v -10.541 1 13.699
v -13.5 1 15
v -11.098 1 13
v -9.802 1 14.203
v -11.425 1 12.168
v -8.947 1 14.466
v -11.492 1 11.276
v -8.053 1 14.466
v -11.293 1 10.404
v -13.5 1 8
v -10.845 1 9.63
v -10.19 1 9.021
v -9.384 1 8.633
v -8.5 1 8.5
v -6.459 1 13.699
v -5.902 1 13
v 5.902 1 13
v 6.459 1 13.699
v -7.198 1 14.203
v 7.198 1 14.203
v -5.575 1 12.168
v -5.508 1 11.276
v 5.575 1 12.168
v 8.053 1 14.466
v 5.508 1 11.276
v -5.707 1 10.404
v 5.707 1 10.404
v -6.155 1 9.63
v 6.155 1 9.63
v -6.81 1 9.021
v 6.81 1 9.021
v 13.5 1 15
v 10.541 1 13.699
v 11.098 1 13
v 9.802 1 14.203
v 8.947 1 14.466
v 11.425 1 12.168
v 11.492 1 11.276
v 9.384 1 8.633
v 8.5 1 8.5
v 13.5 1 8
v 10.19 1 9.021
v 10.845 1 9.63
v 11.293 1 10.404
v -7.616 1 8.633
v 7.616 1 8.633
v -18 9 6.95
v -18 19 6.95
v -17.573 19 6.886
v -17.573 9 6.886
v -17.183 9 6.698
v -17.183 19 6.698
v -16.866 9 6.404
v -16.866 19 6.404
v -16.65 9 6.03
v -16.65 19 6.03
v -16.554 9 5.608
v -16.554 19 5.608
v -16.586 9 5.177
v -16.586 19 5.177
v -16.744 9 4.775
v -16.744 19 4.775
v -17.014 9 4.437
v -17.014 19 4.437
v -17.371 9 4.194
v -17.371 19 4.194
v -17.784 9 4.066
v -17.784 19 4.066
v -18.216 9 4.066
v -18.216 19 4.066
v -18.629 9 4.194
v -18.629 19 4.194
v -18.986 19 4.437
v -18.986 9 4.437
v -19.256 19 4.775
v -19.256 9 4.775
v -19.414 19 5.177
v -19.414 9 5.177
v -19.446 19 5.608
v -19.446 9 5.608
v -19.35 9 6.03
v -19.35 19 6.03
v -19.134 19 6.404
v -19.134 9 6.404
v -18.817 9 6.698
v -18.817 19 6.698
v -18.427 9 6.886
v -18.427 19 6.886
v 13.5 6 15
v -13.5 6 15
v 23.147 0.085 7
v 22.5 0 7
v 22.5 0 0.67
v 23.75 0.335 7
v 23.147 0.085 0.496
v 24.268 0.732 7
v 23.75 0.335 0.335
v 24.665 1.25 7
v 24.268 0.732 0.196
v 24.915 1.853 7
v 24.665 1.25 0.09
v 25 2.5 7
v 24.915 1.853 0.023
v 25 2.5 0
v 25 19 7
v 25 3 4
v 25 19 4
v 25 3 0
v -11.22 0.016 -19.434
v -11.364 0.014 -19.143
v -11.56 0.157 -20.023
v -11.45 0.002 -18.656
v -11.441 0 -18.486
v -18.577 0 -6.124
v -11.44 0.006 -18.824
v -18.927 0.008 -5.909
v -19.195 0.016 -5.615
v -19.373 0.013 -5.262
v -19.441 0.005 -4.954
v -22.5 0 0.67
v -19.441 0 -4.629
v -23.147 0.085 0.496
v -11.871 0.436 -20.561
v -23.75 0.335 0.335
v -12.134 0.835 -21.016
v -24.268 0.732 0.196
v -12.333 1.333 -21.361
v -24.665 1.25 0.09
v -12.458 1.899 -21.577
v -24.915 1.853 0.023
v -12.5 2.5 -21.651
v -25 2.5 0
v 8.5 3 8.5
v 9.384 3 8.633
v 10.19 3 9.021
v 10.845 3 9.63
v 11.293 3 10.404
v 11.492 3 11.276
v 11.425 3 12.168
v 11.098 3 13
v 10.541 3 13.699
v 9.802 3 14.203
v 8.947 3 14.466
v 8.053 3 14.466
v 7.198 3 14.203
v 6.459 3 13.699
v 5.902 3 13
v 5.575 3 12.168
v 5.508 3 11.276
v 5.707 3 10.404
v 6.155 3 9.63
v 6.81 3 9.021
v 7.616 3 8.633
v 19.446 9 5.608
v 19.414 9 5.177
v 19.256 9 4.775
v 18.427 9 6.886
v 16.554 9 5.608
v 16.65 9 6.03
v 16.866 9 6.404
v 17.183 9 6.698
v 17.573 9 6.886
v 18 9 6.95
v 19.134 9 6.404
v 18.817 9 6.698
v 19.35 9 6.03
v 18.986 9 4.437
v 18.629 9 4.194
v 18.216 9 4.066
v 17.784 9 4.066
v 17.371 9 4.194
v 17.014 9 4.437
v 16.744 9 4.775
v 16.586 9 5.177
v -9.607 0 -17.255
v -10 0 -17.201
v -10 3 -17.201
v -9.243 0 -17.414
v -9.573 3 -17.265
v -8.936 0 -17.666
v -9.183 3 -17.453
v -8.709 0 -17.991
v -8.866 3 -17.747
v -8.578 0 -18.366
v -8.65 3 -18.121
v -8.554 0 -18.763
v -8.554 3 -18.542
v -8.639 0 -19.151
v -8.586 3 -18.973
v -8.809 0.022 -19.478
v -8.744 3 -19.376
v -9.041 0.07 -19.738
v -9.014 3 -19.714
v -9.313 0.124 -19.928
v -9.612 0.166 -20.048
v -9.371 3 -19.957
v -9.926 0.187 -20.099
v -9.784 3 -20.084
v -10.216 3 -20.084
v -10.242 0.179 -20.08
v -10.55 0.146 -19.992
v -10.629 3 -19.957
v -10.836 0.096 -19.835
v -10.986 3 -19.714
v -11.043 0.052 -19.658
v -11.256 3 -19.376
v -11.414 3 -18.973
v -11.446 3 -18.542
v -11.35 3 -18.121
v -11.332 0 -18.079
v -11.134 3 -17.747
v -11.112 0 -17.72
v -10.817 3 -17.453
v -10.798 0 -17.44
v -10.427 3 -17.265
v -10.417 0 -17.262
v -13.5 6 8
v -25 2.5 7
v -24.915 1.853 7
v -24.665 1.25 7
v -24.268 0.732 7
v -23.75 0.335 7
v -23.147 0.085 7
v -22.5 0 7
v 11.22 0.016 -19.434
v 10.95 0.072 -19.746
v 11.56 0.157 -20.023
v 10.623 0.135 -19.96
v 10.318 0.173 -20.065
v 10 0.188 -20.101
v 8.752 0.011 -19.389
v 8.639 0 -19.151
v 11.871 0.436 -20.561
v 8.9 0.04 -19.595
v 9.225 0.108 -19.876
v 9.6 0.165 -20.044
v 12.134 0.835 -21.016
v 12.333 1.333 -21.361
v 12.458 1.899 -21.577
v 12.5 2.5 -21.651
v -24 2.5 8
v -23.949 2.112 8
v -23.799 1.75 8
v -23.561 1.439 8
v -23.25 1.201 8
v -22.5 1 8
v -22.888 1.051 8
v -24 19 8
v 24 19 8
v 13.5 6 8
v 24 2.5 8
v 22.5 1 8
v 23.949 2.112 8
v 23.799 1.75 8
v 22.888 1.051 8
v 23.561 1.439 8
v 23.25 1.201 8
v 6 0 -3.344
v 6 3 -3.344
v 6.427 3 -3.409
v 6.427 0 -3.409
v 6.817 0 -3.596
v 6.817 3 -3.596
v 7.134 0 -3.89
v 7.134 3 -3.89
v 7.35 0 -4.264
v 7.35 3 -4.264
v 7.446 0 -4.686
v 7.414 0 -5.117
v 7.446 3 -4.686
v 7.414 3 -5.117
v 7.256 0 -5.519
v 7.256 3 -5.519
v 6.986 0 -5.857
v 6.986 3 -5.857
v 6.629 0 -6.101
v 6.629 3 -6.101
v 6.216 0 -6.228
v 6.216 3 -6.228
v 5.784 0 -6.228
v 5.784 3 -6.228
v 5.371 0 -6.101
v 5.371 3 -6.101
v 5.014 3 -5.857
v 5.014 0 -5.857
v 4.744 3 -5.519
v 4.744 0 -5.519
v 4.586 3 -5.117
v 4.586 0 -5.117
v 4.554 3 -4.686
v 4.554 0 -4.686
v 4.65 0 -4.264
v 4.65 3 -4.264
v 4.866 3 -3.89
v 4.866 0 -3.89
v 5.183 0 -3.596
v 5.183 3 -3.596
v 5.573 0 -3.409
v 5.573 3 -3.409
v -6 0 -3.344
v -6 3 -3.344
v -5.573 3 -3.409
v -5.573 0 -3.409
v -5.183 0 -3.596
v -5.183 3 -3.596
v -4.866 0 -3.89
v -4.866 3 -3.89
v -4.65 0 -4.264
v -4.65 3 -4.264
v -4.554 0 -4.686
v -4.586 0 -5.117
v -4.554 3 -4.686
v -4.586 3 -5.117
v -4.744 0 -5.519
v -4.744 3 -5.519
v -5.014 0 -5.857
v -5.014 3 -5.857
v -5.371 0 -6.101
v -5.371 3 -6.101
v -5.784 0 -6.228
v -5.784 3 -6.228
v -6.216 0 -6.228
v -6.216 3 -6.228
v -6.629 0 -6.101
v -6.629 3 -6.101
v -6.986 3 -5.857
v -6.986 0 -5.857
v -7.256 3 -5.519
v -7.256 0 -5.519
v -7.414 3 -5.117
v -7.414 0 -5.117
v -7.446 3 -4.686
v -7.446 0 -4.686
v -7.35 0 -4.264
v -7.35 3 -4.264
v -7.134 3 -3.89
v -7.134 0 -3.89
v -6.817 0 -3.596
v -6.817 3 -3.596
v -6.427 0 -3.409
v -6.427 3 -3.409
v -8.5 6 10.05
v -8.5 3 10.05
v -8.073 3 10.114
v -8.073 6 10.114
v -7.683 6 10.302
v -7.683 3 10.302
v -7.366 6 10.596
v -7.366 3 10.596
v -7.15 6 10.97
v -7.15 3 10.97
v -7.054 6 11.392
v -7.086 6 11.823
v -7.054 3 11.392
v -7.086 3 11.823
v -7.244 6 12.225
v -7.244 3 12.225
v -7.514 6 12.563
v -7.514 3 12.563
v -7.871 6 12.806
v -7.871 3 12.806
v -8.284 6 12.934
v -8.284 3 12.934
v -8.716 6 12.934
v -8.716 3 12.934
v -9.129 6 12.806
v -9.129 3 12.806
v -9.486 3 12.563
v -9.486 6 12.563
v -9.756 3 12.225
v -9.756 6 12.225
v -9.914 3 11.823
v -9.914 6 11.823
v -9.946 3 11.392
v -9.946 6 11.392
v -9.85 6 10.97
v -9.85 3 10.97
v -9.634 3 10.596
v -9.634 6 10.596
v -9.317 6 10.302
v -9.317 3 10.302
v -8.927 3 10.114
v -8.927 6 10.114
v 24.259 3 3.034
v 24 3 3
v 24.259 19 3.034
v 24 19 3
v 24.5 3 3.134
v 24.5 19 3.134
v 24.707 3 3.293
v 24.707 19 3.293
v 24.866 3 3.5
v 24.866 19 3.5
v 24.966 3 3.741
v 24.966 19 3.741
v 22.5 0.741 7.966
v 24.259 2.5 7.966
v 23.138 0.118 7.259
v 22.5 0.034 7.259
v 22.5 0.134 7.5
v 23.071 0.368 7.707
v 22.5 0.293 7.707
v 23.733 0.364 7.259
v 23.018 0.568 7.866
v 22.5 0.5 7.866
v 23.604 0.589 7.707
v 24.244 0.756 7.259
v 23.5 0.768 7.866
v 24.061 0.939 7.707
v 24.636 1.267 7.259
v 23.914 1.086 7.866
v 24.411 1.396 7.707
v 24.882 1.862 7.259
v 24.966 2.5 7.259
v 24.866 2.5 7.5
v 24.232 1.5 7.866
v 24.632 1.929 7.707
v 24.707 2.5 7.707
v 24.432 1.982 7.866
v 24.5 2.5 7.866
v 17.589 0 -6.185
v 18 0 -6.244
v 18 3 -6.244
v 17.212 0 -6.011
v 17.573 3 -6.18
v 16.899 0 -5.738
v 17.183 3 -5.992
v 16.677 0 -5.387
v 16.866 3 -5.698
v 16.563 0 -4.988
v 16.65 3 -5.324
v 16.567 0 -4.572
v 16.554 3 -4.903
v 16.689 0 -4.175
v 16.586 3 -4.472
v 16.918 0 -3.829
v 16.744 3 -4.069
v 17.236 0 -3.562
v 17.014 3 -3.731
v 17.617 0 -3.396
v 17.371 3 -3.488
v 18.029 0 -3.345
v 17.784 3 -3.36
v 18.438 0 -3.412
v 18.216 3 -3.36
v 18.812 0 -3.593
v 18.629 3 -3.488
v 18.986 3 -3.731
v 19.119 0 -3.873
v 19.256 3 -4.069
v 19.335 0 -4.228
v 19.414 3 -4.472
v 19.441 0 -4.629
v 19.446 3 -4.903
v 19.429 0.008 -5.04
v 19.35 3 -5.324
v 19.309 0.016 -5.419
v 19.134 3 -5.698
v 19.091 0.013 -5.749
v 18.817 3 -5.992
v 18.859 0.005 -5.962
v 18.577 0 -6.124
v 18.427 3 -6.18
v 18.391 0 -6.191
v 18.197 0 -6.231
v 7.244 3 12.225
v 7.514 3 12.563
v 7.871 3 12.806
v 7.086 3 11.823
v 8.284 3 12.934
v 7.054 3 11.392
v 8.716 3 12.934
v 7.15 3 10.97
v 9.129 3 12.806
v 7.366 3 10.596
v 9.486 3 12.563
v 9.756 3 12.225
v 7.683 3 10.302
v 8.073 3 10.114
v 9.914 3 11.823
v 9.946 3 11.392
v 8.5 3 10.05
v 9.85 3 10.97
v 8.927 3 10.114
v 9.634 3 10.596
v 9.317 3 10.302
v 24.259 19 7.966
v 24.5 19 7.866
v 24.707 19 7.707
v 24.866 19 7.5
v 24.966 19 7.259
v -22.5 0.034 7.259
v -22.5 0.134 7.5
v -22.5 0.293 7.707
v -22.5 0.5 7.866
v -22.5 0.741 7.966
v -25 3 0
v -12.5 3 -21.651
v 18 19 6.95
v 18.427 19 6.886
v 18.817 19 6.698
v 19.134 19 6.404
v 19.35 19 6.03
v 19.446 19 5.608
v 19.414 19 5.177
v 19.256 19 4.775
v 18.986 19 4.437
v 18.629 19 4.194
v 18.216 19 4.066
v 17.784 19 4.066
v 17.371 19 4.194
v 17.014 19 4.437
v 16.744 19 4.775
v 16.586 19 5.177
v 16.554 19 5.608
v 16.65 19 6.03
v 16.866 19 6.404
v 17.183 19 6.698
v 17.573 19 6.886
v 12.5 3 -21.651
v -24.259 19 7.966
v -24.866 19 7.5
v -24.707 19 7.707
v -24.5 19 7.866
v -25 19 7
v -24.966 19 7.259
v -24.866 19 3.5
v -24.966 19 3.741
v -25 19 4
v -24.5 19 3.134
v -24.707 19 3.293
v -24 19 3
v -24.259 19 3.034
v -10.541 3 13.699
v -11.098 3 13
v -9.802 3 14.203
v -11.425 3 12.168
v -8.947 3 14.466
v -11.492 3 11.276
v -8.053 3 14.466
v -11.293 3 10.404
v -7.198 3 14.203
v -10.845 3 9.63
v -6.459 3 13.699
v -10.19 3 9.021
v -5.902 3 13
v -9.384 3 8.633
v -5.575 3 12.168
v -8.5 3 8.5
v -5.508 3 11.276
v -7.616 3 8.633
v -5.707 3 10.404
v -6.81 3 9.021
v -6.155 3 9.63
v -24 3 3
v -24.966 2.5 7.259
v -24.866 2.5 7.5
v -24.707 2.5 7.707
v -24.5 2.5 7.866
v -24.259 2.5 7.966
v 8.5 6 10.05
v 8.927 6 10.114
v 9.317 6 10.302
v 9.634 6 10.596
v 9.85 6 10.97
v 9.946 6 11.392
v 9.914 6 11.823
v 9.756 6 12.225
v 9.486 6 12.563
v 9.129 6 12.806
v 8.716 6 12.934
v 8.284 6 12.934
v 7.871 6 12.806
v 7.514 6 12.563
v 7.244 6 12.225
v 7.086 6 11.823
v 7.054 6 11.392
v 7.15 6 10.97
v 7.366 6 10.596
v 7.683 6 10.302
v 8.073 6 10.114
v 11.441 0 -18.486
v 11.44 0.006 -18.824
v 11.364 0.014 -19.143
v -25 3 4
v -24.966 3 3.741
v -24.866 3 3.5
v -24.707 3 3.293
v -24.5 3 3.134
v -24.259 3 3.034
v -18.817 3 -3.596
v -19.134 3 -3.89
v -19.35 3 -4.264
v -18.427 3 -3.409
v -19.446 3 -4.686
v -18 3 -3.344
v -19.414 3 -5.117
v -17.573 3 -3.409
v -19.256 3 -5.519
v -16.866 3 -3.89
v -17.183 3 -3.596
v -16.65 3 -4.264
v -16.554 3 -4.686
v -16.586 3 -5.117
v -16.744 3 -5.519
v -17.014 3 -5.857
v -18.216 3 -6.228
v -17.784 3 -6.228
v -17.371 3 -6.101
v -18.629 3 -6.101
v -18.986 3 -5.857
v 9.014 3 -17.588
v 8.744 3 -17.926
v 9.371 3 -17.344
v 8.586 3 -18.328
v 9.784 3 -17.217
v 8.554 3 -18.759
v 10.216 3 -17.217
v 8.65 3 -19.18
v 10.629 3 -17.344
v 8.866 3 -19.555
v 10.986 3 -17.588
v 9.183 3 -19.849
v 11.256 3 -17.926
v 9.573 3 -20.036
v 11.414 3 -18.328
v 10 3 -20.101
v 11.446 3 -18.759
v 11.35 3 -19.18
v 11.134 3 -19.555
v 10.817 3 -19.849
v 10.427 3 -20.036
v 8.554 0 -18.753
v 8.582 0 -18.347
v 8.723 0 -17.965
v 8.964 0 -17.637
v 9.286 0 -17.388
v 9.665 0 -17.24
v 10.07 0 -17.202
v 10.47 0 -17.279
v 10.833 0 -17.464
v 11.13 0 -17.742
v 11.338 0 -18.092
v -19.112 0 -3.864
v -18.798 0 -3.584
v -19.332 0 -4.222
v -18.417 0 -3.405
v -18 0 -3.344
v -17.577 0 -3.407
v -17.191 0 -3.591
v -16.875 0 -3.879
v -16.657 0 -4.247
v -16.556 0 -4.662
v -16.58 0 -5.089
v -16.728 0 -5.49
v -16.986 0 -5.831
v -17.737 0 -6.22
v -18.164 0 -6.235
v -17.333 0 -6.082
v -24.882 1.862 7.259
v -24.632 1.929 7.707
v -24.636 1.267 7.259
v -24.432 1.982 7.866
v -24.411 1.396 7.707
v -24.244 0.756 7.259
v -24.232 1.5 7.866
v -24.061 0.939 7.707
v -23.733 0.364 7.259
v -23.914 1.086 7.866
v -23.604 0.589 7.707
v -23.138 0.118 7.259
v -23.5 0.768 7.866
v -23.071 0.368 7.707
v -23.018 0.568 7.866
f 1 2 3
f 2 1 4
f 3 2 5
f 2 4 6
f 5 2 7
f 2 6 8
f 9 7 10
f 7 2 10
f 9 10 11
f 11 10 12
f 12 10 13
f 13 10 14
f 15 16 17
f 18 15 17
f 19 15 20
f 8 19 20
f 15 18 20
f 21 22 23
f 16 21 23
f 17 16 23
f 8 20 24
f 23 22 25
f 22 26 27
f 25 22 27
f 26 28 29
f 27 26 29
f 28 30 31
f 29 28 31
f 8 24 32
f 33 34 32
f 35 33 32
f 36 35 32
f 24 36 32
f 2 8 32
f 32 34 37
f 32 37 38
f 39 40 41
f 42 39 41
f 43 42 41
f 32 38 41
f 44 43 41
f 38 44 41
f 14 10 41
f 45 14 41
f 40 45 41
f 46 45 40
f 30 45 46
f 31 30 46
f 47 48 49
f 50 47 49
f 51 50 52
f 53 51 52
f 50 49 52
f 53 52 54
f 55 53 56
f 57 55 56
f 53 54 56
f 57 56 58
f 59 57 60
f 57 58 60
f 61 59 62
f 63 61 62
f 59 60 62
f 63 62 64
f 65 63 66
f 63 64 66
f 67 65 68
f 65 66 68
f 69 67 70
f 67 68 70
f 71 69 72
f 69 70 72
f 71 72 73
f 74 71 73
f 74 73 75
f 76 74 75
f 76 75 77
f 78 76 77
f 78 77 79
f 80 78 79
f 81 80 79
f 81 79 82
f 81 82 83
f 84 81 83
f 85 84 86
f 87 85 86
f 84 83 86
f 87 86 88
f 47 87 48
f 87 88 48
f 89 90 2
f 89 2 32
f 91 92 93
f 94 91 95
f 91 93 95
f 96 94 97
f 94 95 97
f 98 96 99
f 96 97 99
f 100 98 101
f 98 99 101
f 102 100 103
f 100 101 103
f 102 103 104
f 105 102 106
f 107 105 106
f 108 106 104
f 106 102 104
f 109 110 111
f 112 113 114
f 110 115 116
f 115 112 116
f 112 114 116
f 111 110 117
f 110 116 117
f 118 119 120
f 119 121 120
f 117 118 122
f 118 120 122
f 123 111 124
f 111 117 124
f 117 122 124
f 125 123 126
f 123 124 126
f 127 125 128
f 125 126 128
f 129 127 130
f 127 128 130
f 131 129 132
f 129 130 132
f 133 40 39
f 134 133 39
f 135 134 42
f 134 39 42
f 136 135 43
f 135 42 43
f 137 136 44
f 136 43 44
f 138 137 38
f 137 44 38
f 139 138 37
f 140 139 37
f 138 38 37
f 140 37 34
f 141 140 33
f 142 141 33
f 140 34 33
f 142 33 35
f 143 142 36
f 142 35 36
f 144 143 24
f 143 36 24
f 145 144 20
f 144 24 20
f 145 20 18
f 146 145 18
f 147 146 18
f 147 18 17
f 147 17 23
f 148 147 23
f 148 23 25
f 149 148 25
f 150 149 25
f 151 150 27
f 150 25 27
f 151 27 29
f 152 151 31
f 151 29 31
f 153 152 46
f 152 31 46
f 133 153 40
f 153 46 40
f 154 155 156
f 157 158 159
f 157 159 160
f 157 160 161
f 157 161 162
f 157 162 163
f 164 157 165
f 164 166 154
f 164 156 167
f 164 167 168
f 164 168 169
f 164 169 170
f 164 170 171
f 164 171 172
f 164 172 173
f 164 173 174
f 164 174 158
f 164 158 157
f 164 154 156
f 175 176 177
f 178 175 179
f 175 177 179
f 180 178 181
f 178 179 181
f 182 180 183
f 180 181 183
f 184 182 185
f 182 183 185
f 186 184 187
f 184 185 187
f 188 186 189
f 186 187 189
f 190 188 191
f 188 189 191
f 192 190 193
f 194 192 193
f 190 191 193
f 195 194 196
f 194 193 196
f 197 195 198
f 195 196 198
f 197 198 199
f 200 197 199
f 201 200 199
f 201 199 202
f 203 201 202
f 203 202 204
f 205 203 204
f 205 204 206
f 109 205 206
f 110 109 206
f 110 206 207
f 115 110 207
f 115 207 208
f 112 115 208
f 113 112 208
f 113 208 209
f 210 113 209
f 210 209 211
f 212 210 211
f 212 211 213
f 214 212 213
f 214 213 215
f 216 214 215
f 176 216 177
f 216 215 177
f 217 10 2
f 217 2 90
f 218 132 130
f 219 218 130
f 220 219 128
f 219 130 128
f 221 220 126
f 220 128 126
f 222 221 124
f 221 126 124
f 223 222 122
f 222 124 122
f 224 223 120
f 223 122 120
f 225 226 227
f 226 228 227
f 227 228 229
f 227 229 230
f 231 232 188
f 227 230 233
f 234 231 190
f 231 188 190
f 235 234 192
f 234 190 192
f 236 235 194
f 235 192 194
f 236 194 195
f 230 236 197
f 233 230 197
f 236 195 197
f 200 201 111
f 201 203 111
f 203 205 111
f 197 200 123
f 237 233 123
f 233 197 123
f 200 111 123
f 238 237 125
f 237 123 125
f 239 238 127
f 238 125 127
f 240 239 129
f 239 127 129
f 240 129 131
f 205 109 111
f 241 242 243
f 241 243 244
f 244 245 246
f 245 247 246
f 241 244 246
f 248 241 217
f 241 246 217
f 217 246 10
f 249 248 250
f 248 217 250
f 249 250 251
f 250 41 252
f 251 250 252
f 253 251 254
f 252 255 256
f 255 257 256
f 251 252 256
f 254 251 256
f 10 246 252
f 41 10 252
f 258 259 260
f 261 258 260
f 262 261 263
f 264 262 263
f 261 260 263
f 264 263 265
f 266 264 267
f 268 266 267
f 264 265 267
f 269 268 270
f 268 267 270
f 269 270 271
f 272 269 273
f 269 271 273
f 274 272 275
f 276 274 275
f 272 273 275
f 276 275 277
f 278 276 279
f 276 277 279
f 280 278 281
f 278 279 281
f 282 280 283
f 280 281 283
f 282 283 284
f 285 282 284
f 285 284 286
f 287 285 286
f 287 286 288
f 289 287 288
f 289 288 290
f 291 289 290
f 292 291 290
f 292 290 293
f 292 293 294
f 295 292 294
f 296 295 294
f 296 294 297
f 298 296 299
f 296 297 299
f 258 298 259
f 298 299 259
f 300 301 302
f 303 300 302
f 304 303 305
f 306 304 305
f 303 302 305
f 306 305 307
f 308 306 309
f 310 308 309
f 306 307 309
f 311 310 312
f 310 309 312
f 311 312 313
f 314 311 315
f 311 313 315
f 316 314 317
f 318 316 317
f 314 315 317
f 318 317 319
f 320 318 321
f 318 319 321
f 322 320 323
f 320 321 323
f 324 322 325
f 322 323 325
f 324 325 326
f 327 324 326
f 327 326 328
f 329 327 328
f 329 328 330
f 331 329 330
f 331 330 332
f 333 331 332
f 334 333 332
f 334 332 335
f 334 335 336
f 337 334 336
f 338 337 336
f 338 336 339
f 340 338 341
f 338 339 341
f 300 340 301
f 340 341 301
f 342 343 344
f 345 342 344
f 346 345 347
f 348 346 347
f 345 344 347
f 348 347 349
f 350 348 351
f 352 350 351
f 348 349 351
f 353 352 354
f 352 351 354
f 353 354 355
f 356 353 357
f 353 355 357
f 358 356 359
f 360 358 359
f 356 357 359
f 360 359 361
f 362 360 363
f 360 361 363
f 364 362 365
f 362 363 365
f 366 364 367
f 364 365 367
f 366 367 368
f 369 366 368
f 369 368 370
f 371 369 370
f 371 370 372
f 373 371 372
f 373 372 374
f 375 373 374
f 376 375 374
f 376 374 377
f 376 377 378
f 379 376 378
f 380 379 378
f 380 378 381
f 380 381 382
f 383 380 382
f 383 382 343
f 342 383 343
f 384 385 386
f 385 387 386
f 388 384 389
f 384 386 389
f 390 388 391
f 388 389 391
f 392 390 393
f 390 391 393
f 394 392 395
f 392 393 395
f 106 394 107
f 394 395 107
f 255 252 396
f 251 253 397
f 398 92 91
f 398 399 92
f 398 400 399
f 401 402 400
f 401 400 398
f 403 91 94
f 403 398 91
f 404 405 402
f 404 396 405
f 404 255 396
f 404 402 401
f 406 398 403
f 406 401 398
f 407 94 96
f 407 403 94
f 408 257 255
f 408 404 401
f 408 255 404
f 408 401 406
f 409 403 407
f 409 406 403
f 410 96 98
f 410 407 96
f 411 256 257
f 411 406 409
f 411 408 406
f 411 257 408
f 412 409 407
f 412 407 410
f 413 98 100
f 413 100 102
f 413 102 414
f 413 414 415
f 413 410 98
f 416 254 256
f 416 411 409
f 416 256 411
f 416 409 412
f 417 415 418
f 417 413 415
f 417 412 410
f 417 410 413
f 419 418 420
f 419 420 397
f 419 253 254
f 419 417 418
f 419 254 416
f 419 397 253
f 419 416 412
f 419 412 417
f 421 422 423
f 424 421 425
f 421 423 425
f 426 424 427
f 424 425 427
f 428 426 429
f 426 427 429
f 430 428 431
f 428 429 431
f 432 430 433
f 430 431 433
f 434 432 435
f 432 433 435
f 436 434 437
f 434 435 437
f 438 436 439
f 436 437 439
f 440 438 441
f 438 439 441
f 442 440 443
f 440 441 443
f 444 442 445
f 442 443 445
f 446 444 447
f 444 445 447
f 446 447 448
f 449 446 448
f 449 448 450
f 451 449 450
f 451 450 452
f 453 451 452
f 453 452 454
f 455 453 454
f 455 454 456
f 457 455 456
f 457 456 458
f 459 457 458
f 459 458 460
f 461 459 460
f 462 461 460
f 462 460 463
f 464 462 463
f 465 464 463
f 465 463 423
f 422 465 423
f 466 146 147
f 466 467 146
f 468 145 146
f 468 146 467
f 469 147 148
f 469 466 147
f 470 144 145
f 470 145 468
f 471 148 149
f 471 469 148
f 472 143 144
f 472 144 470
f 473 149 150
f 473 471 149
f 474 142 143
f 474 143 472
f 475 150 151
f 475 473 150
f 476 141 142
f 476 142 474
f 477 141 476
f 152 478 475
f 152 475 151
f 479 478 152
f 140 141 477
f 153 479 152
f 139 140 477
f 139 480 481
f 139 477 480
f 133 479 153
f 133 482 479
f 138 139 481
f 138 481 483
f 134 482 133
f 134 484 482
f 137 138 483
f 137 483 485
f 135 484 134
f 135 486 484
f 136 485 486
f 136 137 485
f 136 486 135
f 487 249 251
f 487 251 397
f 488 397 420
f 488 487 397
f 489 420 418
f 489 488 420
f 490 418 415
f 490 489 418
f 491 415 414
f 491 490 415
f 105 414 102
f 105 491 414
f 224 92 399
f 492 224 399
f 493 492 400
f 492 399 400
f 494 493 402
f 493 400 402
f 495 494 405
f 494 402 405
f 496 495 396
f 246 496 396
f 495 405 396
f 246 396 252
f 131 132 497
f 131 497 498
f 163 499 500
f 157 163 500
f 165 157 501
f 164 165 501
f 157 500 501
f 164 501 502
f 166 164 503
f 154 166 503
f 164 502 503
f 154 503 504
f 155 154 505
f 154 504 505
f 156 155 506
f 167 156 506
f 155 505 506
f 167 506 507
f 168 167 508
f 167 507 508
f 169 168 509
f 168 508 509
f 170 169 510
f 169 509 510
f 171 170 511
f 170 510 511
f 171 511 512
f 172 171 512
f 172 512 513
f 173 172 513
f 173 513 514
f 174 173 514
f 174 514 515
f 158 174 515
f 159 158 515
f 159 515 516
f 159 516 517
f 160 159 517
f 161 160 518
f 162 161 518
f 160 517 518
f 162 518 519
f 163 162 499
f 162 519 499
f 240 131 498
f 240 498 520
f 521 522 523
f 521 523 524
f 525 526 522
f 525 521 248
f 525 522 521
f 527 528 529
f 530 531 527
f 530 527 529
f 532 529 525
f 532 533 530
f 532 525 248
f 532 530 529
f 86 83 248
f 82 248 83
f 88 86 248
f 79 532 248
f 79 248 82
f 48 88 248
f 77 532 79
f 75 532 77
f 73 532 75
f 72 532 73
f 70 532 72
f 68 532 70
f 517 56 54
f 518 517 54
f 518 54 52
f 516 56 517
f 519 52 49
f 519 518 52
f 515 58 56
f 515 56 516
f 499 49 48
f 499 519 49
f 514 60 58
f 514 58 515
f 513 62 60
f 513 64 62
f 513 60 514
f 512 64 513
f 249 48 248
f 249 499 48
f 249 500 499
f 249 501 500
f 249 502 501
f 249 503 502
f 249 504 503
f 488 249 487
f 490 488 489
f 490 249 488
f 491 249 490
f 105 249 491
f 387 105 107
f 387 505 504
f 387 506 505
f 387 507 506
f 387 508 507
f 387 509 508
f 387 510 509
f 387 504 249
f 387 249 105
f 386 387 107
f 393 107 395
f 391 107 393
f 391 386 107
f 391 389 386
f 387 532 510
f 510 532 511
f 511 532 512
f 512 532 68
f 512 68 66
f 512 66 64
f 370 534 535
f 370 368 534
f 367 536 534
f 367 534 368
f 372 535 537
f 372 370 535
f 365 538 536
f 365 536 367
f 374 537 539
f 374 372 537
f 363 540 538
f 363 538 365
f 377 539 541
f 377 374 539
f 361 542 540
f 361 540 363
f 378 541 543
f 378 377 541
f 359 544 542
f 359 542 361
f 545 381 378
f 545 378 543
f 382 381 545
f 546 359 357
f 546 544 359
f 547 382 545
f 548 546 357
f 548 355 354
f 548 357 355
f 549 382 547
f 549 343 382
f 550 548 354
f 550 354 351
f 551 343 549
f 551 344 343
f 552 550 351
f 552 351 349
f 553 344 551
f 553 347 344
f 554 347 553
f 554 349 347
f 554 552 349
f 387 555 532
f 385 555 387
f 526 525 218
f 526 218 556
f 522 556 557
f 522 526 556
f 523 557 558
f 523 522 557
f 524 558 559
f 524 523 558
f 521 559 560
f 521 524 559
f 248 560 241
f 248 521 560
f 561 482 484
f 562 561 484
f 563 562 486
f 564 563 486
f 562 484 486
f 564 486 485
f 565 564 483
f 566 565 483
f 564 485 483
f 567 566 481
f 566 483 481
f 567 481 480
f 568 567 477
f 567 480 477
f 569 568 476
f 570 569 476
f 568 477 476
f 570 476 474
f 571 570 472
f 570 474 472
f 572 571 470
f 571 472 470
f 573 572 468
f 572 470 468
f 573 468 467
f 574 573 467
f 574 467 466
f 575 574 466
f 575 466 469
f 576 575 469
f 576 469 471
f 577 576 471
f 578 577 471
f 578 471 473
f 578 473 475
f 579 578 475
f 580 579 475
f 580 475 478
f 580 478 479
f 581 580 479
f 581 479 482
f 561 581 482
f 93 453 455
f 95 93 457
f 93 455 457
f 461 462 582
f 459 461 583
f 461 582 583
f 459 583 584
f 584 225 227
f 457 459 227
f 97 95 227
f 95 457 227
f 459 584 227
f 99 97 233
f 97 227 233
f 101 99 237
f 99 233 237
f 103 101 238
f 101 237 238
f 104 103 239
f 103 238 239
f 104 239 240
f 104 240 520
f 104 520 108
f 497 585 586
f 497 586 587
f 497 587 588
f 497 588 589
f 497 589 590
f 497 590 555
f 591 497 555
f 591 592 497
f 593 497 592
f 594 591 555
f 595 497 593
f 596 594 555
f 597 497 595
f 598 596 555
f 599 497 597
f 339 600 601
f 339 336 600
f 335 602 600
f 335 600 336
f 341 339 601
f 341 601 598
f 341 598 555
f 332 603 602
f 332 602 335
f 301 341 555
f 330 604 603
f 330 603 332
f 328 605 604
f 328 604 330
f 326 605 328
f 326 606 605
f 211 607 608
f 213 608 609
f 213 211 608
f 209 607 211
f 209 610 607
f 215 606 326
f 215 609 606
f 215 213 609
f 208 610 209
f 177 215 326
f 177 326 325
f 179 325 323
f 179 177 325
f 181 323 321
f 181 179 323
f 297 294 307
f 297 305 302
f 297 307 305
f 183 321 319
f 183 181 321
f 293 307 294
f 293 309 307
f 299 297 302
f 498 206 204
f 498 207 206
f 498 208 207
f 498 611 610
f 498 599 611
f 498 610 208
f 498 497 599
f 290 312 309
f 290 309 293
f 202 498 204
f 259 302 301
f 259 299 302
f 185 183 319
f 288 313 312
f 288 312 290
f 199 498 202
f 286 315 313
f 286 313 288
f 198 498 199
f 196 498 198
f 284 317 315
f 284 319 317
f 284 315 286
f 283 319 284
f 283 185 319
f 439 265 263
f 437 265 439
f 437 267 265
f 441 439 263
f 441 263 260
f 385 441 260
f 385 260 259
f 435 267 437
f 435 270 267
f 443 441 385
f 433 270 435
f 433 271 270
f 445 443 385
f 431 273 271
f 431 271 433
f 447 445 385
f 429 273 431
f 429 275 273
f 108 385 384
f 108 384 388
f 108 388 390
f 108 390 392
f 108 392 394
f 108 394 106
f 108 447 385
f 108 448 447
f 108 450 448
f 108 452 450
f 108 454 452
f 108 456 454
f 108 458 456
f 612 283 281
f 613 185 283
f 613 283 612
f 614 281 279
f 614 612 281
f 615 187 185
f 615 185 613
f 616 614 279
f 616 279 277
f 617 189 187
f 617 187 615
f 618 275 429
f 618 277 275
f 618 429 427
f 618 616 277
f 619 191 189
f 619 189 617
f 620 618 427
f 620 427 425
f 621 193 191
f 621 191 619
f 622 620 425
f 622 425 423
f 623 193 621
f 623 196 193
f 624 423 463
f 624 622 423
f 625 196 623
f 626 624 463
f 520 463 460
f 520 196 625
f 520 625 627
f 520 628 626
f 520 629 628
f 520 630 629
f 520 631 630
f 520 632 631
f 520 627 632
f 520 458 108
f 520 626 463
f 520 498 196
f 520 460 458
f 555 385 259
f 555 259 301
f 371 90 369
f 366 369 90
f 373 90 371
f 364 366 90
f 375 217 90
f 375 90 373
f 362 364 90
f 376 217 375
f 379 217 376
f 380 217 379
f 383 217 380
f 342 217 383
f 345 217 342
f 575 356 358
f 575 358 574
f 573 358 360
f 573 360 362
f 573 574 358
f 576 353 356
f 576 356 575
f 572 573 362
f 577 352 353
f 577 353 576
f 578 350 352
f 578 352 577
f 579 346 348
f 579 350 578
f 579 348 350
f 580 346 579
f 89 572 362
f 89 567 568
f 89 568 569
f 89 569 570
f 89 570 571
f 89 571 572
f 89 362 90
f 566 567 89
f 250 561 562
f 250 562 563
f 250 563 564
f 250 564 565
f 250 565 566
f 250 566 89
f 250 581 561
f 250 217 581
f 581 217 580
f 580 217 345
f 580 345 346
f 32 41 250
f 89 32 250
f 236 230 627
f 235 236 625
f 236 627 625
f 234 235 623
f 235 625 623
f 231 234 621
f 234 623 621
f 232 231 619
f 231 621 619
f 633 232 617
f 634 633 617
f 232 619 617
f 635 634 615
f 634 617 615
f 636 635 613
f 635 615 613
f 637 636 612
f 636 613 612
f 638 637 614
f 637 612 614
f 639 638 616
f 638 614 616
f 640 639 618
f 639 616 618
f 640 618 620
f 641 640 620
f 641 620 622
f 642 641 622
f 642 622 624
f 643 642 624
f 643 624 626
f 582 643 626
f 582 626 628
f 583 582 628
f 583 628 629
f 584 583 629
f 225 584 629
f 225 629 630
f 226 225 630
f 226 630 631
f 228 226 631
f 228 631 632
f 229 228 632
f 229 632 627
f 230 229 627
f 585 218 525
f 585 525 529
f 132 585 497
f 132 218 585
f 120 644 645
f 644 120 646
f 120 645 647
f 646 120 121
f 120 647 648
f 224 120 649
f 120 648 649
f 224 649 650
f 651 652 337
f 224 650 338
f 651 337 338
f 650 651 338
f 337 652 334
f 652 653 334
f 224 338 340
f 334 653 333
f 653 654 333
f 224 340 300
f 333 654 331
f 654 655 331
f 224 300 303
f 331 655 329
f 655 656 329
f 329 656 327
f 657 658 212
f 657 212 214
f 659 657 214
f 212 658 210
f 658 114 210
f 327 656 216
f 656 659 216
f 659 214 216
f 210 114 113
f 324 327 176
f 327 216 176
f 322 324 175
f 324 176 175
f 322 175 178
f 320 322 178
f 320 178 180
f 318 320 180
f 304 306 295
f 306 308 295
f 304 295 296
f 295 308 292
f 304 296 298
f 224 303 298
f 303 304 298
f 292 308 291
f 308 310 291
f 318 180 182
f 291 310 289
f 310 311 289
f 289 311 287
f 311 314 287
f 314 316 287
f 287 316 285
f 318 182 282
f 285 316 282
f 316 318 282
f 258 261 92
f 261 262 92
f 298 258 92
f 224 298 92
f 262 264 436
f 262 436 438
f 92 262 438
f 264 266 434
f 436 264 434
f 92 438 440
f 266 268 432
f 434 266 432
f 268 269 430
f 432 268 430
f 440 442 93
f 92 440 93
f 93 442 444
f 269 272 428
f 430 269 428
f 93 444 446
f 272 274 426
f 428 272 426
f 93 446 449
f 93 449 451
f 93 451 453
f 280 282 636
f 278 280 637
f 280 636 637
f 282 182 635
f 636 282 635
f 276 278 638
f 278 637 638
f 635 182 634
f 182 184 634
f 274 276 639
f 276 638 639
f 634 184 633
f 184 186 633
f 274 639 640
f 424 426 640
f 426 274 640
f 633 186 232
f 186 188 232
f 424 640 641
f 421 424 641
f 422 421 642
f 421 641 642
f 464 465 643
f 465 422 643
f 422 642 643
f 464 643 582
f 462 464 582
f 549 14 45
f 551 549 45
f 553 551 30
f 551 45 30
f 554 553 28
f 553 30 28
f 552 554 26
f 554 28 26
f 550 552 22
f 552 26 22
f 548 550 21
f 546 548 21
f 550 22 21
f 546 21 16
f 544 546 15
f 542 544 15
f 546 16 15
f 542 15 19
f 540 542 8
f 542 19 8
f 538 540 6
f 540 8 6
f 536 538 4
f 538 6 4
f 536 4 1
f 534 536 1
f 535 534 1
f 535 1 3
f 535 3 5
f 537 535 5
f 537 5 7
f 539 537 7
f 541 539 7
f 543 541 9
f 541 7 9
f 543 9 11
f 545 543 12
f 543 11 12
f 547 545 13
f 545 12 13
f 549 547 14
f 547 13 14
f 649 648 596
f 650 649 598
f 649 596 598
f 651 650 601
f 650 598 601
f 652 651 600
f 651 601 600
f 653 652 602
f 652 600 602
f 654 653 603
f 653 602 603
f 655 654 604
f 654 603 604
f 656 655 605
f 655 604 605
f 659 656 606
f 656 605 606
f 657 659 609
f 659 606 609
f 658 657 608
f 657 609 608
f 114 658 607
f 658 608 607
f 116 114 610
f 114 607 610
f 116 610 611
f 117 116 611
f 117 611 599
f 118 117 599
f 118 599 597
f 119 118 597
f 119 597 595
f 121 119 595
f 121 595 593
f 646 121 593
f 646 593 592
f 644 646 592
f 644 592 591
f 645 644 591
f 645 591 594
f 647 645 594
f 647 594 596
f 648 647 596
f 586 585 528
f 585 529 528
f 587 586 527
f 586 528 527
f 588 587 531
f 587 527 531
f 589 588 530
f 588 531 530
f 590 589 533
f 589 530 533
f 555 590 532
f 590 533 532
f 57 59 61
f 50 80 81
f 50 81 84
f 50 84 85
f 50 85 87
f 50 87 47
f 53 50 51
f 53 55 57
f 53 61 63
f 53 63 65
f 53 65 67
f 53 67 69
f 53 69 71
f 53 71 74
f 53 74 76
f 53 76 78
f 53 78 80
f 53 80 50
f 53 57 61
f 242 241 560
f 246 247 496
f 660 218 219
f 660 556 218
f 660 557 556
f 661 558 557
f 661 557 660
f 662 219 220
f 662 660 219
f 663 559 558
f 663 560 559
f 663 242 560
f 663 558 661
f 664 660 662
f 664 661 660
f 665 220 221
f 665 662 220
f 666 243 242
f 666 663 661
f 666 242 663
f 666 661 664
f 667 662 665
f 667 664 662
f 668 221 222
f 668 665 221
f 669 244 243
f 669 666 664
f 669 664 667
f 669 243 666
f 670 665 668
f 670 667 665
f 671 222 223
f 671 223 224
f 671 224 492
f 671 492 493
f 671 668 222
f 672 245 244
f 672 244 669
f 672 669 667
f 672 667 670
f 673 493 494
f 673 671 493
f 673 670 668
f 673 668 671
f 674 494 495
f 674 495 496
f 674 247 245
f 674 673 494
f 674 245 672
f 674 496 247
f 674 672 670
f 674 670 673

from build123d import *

# Parameters (mm, degrees)
EXTRUDE_1_DEPTH     = 3
SKETCH_2_R          = 1.45
CUT_EXTRUDE_1_DEPTH = 3
SKETCH_3_W          = 50
SKETCH_3_H          = 3
EXTRUDE_2_DEPTH     = 8
SKETCH_4_W          = 50
SKETCH_4_H          = 5
EXTRUDE_3_DEPTH     = 16
SKETCH_6_W          = 27
SKETCH_6_H          = 5
EXTRUDE_4_DEPTH     = 7
SKETCH_7_R          = 1.45
CUT_EXTRUDE_2_DEPTH = 7
SKETCH_8_R          = 3
CUT_EXTRUDE_3_DEPTH = 2
FILLET_1_R          = 1
FILLET_2_R          = 2.5
SKETCH_9_R          = 1.45
CUT_EXTRUDE_4_DEPTH = 10


# Some blends are built 0.0001 mm under size
with BuildPart() as part:
    # Эскиз1 → Бобышка-Вытянуть1 (new body)
    with BuildSketch(Plane(origin=(0, 0, 0), x_dir=(1, 0, 0), z_dir=(0, 1, 0))):
        Polygon((-25, 0), (-12.5, 21.650635095), (12.5, 21.650635095), (25, 0), align=None)
    extrude(amount=EXTRUDE_1_DEPTH)

    # Эскиз2 → Вырез-Вытянуть1 (cut)
    with BuildSketch(Plane(origin=(0, 3, 0), x_dir=(1, 0, 0), z_dir=(0, 1, 0))):
        with Locations(Location((-10, 18.650635095, 0), (0, 0, 270))):
            Circle(SKETCH_2_R)
        with Locations(Location((-18, 4.794228634, 0), (0, 0, 270))):
            Circle(SKETCH_2_R)
        with Locations(Location((18, 4.794228634, 0), (0, 0, 90))):
            Circle(SKETCH_2_R)
        with Locations(Location((10, 18.650635095, 0), (0, 0, 90))):
            Circle(SKETCH_2_R)
        with Locations(Location((-6, 4.794228634, 0), (0, 0, 270))):
            Circle(SKETCH_2_R)
        with Locations(Location((6, 4.794228634, 0), (0, 0, 270))):
            Circle(SKETCH_2_R)
    extrude(amount=-CUT_EXTRUDE_1_DEPTH, mode=Mode.SUBTRACT)

    # Эскиз3 → Бобышка-Вытянуть2 (add)
    with BuildSketch(Plane.XY):
        with Locations((0, 1.5)):
            Rectangle(SKETCH_3_W, SKETCH_3_H)
    extrude(amount=EXTRUDE_2_DEPTH)

    # Эскиз4 → Бобышка-Вытянуть3 (add)
    with BuildSketch(Plane(origin=(0, 3, 0), x_dir=(1, 0, 0), z_dir=(0, 1, 0))):
        with Locations((0, -5.5)):
            Rectangle(SKETCH_4_W, SKETCH_4_H)
    extrude(amount=EXTRUDE_3_DEPTH)

    # Эскиз6 → Бобышка-Вытянуть4 (add)
    with BuildSketch(Plane.XY.offset(8)):
        with Locations((0, 3.5)):
            Rectangle(SKETCH_6_W, SKETCH_6_H)
    extrude(amount=EXTRUDE_4_DEPTH)

    # Эскиз7 → Вырез-Вытянуть2 (cut)
    with BuildSketch(Plane.XZ.offset(-1)):
        with Locations(Location((-8.5, 11.5, 0), (0, 0, 270))):
            Circle(SKETCH_7_R)
        with Locations(Location((8.5, 11.5, 0), (0, 0, 270))):
            Circle(SKETCH_7_R)
    extrude(amount=-CUT_EXTRUDE_2_DEPTH, mode=Mode.SUBTRACT)

    # Эскиз8 → Вырез-Вытянуть3 (cut)
    with BuildSketch(Plane.XZ.offset(-1)):
        with Locations(Location((-8.5, 11.5, 0), (0, 0, 270))):
            Circle(SKETCH_8_R)
        with Locations(Location((8.5, 11.5, 0), (0, 0, 270))):
            Circle(SKETCH_8_R)
    extrude(amount=-CUT_EXTRUDE_3_DEPTH, mode=Mode.SUBTRACT)

    # Скругление1
    fillet_1_edges = [part.edges().sort_by_distance(p)[0] for p in [
        (25, 9.5, 8),
        (-25, 9.5, 8),
        (0, 0, 8),
        (-25, 11, 3),
        (25, 11, 3),
    ]]
    fillet(fillet_1_edges, radius=FILLET_1_R - 0.0001)  # a hair under: the kernel refuses the full size

    # Скругление2
    # the kernel refuses this fillet: 2.5 mm, written as the material it takes off along each edge
    with BuildSketch(Plane(origin=(22.5, 2.5, 8), x_dir=(0, -1, 0), z_dir=(-1, 0, 0))) as fillet_2_piece_1:
        with BuildLine():
            CenterArc((1.5001, -0.9999), 0.9999, 0, 90)
            Line((2.5, -0.9999), (2.5, 0))
            Line((2.5, 0), (1.5001, 0))
        make_face()
    revolve(axis=Axis((22.5, 2.5, 8), (0, 0, 1)), revolution_arc=90, mode=Mode.SUBTRACT)
    with BuildSketch(Plane(origin=(-22.5, 2.5, 8), x_dir=(-1, 0, 0), z_dir=(0, 1, 0))) as fillet_2_piece_2:
        with BuildLine():
            CenterArc((1.5001, -0.9999), 0.9999, 0, 90)
            Line((2.5, -0.9999), (2.5, 0))
            Line((2.5, 0), (1.5001, 0))
        make_face()
    revolve(axis=Axis((-22.5, 2.5, 8), (0, 0, 1)), revolution_arc=90, mode=Mode.SUBTRACT)
    with BuildSketch(Plane(origin=(25, 0, -6.25), x_dir=(0, 1, 0), z_dir=(0, 0, 1))) as fillet_2_piece_3:
        with BuildLine():
            CenterArc((FILLET_2_R, FILLET_2_R), FILLET_2_R, 180, 90)
            Line((0, FILLET_2_R), (0, 0))
            Line((0, 0), (FILLET_2_R, 0))
        make_face()
    extrude(amount=14.25, mode=Mode.SUBTRACT)
    with BuildSketch(Plane(origin=(-25, 0, -6.25), x_dir=(0, 1, 0), z_dir=(0, 0, 1))) as fillet_2_piece_4:
        with BuildLine():
            CenterArc((FILLET_2_R, -FILLET_2_R), FILLET_2_R, 90, 90)
            Line((0, -FILLET_2_R), (0, 0))
            Line((0, 0), (FILLET_2_R, 0))
        make_face()
    extrude(amount=14.25, mode=Mode.SUBTRACT)
    with BuildSketch(Plane(origin=(-28.125, 0, 5.412658774), x_dir=(0, 1, 0), z_dir=(0.5000000000000041, 0, -0.8660254037844364)), Plane(origin=(-18.75, 0, -21.650635095), x_dir=(0, 1, 0), z_dir=(1, 0, 0)), Plane(origin=(9.375, 0, -27.063293868), x_dir=(0, 1, 0), z_dir=(0.5000000000000041, 0, 0.8660254037844364))) as fillet_2_piece_5:
        with BuildLine():
            CenterArc((FILLET_2_R, FILLET_2_R), FILLET_2_R, 180, 90)
            Line((0, FILLET_2_R), (0, 0))
            Line((0, 0), (FILLET_2_R, 0))
        make_face()
    extrude(amount=37.5, mode=Mode.SUBTRACT)

    # Эскиз9 → Вырез-Вытянуть4 (cut)
    with BuildSketch(Plane(origin=(0, 19, 0), x_dir=(1, 0, 0), z_dir=(0, 1, 0))):
        with Locations(Location((-18, -5.5, 0), (0, 0, 270))):
            Circle(SKETCH_9_R)
        with Locations(Location((18, -5.5, 0), (0, 0, 270))):
            Circle(SKETCH_9_R)
    extrude(amount=-CUT_EXTRUDE_4_DEPTH, mode=Mode.SUBTRACT)


solid = part.part
